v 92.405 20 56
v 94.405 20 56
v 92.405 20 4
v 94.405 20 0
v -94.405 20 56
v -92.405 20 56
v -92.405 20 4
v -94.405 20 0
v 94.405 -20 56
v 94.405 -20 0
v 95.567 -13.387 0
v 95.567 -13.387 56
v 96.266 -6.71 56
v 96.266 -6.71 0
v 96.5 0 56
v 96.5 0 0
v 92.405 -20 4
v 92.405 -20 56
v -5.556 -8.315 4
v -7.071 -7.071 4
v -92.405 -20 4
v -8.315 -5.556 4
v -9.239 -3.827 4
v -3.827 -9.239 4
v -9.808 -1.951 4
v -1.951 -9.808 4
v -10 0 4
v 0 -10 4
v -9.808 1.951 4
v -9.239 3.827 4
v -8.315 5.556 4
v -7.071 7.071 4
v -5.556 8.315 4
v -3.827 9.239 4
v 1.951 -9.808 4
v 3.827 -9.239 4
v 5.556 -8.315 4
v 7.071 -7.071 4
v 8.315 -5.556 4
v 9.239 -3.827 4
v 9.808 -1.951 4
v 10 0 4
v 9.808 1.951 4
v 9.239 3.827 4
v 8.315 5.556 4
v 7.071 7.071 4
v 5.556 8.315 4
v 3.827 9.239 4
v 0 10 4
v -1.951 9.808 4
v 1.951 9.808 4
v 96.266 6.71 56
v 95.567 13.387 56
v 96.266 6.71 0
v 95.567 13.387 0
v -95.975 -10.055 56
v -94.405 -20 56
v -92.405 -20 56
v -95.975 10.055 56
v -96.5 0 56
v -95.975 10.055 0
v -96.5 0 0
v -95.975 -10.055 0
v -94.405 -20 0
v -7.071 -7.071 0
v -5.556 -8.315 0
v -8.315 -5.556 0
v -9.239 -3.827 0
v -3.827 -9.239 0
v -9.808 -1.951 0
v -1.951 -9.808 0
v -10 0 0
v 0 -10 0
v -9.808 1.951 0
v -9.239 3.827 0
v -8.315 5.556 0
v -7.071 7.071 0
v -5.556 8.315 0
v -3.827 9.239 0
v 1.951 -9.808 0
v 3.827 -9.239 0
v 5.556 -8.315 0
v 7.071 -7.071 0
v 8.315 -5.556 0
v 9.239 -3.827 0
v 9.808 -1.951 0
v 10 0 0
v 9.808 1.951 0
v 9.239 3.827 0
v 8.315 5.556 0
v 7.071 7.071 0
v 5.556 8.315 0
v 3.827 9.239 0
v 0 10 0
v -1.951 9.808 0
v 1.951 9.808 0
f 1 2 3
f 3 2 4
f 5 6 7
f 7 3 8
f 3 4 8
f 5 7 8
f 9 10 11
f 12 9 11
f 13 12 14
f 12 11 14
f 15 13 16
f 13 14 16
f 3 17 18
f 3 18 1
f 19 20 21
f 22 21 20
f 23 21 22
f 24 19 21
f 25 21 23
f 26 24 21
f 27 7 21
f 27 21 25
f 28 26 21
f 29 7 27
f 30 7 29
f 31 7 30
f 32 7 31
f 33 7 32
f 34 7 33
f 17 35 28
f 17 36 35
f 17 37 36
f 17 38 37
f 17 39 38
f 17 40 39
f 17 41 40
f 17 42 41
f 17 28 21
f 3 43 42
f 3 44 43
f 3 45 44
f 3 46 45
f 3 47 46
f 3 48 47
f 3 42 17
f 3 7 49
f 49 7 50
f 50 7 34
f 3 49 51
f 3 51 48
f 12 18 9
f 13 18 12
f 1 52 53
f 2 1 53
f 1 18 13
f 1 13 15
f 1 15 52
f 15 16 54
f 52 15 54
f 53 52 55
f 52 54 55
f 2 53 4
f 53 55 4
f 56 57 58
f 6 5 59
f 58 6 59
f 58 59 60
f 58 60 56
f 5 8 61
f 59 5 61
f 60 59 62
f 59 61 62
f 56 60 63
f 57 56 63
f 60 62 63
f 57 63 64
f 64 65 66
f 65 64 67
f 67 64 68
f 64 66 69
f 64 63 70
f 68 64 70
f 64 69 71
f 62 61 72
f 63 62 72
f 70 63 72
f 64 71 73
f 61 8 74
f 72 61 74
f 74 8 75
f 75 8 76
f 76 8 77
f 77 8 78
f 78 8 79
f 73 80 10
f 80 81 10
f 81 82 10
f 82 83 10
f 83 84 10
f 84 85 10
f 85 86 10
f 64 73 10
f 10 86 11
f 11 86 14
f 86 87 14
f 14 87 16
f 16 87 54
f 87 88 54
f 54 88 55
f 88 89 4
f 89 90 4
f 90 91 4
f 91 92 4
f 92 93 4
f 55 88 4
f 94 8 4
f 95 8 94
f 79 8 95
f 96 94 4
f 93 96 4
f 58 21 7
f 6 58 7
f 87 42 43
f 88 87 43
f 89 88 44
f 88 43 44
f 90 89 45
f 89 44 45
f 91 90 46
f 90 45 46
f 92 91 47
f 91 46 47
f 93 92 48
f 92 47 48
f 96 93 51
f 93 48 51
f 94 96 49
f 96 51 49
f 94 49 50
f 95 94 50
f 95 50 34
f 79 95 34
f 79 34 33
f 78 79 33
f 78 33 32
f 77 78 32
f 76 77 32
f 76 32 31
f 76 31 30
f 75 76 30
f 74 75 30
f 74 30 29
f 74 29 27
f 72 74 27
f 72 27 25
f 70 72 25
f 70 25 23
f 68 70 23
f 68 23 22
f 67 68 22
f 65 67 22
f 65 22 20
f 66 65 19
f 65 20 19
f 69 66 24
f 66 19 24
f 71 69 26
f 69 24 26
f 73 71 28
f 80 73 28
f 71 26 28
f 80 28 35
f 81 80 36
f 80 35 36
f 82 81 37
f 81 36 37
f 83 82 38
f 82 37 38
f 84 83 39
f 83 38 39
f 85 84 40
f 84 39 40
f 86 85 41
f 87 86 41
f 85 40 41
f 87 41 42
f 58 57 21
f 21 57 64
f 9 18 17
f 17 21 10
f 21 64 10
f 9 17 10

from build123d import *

# Parameters (mm, degrees)
F1_DEPTH = 56
F2_W     = 184.809428
F2_H     = 40
F2_R     = 10
F3_DEPTH = 52
F4_DEPTH = 60


with BuildPart() as f1:
    # F0 (on Top) → F1 (new body)
    with BuildSketch(Plane.XY):
        with BuildLine():
            ThreePointArc((94.404714, -20), (95.974749, -10.054728), (96.5, 0))
            ThreePointArc((96.5, 0), (95.974749, 10.054728), (94.404714, 20))
            Line((94.404714, 20), (0, 20))
            Line((0, 20), (-94.404714, 20))
            ThreePointArc((-94.404714, 20), (-96.5, 0), (-94.404714, -20))
            Line((-94.404714, -20), (0, -20))
            Line((0, -20), (94.404714, -20))
        make_face()
    extrude(amount=F1_DEPTH)

    # F2 (on face) → F3 (cut)
    with BuildSketch(Plane.XY.offset(56)):
        Rectangle(F2_W, F2_H)
        Circle(F2_R, mode=Mode.SUBTRACT)
    extrude(amount=-F3_DEPTH, mode=Mode.SUBTRACT)

    # F2 (on face) → F4 (cut)
    with BuildSketch(Plane.XY.offset(56)):
        Circle(F2_R)
    extrude(amount=-F4_DEPTH, mode=Mode.SUBTRACT)


solid = f1.part
